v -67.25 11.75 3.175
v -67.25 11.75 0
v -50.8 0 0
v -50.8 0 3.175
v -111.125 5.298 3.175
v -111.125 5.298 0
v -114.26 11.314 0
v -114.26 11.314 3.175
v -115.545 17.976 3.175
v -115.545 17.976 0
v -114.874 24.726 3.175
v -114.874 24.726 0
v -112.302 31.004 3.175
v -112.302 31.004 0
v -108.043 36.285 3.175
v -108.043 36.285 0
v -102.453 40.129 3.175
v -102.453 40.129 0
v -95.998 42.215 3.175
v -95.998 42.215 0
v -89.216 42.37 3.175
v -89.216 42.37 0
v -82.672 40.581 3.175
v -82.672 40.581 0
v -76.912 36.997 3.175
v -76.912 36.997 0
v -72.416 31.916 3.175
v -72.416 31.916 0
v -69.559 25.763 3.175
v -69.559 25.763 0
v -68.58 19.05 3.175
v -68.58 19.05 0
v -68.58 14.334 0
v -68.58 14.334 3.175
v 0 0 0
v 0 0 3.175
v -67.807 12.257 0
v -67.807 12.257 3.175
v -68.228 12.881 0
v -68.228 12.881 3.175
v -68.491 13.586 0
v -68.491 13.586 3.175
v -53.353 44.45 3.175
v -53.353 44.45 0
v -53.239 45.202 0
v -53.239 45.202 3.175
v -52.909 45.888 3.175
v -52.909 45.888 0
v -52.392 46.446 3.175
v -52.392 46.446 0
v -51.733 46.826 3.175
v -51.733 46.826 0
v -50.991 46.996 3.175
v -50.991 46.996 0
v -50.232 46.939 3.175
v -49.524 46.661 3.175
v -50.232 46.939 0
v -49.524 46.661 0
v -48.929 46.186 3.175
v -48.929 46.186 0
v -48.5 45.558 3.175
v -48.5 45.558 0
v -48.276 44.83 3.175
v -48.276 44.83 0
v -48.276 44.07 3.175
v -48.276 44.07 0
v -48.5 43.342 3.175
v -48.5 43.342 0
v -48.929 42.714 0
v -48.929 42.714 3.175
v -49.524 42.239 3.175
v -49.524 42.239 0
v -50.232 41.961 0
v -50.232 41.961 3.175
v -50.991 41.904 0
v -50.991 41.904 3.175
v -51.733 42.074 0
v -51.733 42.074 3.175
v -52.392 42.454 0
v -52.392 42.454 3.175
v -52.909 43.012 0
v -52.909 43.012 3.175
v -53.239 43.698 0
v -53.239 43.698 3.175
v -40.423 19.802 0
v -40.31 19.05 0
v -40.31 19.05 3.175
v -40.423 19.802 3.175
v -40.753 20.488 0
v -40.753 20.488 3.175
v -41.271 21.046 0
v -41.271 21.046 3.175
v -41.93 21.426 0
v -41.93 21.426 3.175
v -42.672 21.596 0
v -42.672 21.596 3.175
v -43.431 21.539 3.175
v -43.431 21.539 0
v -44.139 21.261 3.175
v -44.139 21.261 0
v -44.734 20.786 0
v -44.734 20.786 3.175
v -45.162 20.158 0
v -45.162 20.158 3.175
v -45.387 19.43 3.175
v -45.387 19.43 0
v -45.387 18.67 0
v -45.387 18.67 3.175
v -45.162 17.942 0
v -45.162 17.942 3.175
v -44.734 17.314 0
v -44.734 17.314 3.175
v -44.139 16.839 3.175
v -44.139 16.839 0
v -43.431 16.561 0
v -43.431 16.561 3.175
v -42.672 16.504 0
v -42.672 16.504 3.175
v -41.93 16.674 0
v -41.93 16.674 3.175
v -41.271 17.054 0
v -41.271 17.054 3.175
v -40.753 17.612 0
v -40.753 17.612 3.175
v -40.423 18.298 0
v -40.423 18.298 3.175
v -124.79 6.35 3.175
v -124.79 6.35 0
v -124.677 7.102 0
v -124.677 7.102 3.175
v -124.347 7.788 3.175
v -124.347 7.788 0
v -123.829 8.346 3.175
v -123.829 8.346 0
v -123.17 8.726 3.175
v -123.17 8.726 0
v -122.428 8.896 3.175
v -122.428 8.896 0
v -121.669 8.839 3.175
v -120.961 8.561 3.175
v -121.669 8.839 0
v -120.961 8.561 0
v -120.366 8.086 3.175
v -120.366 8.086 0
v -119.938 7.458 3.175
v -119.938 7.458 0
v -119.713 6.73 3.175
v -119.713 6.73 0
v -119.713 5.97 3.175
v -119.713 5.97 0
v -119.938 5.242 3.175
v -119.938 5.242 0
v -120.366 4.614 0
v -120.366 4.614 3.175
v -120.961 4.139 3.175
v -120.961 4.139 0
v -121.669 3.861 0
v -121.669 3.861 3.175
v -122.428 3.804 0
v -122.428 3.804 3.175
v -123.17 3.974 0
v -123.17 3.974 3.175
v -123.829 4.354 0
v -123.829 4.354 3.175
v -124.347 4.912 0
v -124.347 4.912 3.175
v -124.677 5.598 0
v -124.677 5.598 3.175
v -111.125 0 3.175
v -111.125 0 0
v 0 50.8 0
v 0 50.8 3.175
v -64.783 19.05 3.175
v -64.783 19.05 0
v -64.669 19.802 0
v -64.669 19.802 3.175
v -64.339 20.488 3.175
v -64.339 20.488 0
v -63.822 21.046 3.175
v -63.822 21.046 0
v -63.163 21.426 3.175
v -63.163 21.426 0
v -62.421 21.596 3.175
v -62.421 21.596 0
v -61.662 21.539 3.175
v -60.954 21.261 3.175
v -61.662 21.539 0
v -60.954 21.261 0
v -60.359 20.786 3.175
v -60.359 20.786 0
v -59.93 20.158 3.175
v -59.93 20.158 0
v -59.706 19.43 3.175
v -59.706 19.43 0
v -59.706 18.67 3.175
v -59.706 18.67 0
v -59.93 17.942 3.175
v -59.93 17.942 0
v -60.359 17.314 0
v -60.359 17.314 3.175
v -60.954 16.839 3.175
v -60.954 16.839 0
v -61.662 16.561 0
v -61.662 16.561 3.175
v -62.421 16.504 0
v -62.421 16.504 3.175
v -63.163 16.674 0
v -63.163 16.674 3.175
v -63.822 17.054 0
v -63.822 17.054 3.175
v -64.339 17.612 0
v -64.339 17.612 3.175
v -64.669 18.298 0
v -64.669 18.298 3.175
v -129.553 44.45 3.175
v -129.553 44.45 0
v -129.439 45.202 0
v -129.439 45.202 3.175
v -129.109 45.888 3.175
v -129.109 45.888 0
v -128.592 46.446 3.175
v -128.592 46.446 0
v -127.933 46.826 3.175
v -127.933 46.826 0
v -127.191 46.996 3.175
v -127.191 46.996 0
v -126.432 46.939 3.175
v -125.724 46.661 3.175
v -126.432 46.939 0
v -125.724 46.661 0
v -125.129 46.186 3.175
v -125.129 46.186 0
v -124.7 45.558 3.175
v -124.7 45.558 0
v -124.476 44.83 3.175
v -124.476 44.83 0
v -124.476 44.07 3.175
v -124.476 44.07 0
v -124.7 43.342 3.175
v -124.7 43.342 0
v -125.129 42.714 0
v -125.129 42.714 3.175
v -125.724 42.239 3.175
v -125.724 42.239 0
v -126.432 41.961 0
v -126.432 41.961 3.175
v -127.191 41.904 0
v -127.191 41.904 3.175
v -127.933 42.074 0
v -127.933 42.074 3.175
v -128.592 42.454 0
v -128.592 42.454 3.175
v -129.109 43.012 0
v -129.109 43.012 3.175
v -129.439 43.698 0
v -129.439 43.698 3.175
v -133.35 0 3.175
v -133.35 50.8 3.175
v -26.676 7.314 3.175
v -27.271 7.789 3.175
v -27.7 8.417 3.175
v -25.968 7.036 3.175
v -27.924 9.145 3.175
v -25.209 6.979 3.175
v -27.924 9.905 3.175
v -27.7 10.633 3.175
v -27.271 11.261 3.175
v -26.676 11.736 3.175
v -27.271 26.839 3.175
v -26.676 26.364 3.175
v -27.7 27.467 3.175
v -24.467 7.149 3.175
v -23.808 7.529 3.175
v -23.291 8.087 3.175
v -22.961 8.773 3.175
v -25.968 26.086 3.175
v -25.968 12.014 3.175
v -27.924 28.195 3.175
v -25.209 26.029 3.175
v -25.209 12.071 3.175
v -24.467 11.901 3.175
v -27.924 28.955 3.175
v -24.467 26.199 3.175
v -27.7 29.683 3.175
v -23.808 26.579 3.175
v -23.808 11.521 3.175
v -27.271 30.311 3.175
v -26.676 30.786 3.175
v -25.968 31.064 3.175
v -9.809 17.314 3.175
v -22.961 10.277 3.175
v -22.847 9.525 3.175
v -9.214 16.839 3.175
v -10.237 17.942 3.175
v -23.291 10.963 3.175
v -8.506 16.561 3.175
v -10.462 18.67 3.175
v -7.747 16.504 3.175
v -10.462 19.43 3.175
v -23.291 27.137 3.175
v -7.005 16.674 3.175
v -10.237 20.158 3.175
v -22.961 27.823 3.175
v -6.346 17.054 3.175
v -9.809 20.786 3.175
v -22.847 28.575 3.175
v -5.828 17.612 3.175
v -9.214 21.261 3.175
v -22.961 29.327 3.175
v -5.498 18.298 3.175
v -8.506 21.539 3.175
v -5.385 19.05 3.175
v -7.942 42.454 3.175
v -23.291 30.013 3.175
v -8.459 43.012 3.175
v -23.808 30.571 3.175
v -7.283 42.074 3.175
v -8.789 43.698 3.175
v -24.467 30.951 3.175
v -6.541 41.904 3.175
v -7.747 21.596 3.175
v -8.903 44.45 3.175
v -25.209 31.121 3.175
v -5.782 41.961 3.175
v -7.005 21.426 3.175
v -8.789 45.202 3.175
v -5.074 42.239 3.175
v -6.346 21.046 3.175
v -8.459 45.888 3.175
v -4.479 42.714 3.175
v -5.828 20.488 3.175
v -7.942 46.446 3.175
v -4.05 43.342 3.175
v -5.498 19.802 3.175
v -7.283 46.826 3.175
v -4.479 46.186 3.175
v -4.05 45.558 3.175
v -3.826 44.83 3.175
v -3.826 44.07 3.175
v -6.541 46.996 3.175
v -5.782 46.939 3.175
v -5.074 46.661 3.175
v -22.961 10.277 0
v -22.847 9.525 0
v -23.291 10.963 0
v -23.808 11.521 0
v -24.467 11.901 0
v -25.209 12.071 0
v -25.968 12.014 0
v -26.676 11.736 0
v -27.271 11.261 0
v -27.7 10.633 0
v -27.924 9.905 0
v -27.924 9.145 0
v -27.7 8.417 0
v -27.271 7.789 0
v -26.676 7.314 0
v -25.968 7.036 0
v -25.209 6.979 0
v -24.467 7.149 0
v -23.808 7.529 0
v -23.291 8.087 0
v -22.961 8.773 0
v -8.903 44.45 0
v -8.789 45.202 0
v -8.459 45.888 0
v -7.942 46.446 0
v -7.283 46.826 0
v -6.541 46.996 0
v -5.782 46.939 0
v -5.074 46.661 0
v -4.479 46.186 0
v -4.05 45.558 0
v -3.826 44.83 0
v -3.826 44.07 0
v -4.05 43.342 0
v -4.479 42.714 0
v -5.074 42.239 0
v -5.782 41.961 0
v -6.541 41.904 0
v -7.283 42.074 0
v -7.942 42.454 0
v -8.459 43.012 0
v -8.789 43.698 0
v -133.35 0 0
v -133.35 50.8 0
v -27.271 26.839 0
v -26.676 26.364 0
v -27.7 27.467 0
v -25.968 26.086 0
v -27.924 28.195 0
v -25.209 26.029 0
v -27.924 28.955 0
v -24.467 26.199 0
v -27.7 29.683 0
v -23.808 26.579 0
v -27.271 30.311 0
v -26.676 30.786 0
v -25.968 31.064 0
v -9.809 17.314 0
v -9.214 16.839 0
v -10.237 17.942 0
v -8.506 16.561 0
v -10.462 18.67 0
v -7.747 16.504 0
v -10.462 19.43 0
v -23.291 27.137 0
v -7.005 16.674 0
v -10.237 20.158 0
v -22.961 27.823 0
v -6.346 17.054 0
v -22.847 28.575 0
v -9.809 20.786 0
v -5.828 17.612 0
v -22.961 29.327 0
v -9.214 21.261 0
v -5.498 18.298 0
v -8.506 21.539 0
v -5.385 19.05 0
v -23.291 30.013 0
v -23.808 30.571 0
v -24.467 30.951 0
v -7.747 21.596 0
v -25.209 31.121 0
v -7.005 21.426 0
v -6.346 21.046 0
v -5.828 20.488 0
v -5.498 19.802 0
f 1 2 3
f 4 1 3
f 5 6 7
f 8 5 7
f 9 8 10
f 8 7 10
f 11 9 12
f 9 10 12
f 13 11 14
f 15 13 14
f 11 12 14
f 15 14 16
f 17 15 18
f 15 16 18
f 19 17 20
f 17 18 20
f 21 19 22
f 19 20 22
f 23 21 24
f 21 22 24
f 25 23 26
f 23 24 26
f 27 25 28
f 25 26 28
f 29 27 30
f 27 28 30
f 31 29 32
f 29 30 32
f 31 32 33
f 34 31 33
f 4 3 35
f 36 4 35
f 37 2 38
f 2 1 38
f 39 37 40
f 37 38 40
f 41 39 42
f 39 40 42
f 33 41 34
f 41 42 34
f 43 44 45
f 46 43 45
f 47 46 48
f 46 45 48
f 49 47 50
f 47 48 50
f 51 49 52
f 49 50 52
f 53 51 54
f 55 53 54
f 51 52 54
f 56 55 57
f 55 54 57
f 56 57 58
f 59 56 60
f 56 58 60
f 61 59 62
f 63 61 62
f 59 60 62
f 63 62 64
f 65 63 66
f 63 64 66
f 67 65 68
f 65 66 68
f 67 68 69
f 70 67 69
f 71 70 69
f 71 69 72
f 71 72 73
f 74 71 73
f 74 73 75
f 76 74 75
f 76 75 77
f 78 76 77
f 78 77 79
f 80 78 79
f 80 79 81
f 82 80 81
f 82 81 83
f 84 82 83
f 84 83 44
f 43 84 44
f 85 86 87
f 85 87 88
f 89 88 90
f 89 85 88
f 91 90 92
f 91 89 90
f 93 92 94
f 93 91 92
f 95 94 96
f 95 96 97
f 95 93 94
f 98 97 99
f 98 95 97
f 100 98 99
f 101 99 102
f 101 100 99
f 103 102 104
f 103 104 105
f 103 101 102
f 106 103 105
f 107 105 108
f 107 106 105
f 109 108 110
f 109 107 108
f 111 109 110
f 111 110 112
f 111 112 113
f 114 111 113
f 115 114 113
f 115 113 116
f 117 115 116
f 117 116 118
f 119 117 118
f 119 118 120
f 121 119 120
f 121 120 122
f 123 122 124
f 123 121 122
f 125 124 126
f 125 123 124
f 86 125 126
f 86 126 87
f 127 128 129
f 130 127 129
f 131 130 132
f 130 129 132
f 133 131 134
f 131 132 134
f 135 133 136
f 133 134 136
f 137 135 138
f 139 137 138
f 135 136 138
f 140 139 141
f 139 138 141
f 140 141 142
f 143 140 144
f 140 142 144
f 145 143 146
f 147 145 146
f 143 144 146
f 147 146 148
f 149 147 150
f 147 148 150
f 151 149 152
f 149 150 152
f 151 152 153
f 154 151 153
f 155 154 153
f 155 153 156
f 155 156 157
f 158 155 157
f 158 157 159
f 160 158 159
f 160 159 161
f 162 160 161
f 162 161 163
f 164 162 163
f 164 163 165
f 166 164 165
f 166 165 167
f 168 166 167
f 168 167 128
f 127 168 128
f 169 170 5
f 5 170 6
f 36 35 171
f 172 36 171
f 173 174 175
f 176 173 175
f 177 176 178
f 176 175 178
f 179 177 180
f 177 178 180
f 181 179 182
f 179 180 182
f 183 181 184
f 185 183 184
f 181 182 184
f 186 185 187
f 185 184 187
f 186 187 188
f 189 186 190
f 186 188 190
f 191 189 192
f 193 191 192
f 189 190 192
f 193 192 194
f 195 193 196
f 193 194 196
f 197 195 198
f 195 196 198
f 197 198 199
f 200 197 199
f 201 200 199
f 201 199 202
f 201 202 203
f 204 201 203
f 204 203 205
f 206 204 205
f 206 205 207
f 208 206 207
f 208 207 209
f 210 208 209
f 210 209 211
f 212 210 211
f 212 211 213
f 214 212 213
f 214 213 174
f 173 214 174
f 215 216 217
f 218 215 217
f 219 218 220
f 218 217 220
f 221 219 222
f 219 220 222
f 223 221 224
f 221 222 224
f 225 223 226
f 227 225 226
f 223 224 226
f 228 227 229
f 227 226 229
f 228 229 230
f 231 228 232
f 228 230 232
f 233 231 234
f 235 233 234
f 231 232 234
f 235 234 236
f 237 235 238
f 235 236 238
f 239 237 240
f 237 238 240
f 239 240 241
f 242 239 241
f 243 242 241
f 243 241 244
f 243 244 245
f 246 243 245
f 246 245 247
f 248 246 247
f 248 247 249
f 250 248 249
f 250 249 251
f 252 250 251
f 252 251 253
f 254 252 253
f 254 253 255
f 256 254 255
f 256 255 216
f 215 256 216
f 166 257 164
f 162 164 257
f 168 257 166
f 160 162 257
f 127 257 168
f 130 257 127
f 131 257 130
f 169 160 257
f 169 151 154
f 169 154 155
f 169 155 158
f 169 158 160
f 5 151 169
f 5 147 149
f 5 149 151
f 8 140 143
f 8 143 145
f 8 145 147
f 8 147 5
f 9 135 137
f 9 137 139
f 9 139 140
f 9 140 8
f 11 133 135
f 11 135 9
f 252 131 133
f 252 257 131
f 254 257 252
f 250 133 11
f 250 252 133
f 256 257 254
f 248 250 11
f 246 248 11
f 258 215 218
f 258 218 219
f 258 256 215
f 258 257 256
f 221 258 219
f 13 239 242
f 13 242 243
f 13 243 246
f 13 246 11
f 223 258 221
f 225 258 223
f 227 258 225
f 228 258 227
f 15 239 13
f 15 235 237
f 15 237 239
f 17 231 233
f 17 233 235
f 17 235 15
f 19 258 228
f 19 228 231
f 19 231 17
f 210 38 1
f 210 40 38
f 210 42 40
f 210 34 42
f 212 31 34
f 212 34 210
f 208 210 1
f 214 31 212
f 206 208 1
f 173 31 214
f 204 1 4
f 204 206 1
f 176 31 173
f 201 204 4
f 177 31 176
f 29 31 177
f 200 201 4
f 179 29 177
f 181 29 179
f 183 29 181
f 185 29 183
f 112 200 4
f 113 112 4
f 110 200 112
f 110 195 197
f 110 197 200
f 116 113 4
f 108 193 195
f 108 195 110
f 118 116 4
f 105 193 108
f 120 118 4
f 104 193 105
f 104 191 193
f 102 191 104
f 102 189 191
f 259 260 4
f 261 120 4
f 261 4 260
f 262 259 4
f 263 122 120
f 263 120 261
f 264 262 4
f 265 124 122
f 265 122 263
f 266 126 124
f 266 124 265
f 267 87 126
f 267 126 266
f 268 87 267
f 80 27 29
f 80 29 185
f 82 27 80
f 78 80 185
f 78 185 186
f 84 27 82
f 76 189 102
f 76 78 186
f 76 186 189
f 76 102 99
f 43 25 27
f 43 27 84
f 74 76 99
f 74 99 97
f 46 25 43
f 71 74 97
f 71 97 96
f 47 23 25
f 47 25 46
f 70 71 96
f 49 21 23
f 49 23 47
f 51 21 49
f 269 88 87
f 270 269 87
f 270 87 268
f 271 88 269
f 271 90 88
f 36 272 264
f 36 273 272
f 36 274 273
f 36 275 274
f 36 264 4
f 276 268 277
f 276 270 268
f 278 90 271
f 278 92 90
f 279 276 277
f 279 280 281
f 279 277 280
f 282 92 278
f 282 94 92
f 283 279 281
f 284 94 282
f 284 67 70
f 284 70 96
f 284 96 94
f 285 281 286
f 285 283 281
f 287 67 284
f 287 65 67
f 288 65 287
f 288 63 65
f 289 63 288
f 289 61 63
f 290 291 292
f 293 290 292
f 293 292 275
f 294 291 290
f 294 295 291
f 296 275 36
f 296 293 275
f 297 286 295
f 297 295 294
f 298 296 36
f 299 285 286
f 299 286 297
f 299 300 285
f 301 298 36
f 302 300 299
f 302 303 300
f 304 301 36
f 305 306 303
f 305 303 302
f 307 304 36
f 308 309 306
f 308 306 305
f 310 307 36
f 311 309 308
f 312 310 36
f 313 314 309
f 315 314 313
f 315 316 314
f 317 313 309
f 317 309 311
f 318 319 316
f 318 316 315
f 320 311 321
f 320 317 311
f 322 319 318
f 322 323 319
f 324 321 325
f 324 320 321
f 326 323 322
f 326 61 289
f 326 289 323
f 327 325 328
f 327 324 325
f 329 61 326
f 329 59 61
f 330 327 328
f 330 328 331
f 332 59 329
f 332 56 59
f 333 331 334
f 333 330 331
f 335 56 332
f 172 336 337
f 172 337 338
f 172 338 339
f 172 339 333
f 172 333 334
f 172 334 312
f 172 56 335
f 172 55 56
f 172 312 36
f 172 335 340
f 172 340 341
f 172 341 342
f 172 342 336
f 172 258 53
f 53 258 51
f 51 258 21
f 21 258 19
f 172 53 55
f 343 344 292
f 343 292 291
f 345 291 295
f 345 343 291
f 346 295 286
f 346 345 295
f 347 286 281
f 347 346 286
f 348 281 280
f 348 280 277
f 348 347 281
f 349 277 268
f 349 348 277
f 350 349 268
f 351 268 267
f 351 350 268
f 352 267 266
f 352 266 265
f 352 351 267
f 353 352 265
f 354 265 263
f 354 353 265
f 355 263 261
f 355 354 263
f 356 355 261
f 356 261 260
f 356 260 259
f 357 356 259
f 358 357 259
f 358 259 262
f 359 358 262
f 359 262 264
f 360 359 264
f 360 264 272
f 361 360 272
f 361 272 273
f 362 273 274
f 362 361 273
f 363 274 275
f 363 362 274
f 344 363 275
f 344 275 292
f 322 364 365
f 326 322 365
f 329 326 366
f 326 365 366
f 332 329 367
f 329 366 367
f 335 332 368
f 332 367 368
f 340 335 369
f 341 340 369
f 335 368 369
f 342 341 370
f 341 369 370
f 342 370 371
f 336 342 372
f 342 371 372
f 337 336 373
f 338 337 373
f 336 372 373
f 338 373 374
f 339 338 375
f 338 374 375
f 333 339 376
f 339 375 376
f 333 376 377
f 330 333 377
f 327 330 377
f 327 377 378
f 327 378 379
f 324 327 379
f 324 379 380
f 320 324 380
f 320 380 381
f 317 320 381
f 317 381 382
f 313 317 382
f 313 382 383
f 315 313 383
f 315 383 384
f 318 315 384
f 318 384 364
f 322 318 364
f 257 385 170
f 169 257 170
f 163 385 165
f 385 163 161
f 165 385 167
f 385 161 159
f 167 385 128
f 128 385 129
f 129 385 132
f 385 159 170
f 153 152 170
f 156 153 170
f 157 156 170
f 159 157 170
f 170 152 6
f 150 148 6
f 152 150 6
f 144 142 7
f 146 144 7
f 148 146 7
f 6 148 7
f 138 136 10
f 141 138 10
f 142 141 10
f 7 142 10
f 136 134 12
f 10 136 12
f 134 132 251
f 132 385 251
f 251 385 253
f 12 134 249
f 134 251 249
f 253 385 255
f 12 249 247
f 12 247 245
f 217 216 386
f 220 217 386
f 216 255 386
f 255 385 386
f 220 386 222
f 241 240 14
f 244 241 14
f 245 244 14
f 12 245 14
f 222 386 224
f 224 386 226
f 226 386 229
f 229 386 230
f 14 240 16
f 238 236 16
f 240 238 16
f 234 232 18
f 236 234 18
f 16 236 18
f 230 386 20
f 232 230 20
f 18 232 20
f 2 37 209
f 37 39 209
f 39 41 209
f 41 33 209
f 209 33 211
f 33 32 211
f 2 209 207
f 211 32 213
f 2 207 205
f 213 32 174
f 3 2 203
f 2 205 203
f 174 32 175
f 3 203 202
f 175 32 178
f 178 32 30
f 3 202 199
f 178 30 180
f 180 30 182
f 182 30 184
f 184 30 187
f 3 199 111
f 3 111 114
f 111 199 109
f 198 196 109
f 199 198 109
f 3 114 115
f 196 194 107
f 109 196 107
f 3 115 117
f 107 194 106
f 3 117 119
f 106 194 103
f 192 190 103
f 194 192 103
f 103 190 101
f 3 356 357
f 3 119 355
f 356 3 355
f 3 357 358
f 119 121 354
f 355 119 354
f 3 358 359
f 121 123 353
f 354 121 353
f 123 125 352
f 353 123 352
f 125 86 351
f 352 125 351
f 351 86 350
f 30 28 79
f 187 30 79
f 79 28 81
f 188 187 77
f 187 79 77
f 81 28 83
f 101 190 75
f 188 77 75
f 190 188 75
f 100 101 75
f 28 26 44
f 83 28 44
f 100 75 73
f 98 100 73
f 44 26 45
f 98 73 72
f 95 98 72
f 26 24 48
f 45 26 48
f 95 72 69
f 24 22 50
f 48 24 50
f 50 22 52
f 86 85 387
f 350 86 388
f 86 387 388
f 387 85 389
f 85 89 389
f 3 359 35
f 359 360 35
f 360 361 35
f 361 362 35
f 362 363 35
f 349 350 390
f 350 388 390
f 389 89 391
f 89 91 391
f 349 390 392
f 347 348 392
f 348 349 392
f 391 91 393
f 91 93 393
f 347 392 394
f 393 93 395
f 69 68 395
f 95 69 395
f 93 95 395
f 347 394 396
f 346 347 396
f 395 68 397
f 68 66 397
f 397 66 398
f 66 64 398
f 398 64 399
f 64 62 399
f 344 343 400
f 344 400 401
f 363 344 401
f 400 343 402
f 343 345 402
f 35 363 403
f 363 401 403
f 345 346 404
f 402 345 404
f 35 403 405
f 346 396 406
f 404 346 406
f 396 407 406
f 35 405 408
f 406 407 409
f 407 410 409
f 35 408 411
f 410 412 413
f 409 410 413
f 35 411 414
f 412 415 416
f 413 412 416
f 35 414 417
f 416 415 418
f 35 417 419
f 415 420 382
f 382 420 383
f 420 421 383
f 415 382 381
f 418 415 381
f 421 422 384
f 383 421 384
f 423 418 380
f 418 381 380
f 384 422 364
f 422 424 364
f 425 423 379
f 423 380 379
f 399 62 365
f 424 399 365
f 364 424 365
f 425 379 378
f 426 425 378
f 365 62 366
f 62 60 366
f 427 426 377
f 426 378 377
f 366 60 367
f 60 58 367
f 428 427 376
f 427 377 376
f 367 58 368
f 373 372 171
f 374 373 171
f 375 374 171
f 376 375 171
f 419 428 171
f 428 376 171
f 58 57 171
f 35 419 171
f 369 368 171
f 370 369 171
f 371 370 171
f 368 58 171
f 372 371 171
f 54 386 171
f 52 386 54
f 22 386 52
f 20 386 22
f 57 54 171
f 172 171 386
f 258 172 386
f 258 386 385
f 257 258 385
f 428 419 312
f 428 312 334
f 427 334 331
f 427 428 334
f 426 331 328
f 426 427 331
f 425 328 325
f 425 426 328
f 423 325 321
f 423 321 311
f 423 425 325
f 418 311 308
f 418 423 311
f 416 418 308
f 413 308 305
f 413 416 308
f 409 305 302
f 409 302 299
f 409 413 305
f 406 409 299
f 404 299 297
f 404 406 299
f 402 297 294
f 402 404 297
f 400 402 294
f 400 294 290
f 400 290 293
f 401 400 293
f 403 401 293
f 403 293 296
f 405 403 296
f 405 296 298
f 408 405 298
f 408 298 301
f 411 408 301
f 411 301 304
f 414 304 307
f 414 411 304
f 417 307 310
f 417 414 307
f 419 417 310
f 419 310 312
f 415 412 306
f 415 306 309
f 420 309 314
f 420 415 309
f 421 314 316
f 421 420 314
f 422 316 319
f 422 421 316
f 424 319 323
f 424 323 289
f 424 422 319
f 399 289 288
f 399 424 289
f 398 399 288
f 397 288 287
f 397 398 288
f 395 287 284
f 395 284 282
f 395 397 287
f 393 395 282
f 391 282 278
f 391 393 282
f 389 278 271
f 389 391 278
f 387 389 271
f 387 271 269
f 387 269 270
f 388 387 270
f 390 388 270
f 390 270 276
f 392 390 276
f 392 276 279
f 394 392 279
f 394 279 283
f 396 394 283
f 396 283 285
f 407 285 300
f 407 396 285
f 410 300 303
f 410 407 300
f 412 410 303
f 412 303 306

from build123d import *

# Parameters (mm, degrees)
SKETCH1_R           = 2.5527
BOSS_EXTRUDE1_DEPTH = 3.175
SKETCH3_R           = 2.5527
CUT_EXTRUDE2_DEPTH  = 143.733819135
FILLET1_R           = 3.175


with BuildPart() as part:
    # Sketch1 → Boss-Extrude1 (new body)
    with BuildSketch(Plane.XY):
        with BuildLine():
            Line((0, 0), (0, 50.8))
            Line((0, 50.8), (-133.35, 50.8))
            Line((-133.35, 50.8), (-133.35, 0))
            Line((-133.35, 0), (-111.125, 0))
            Line((-111.125, 0), (-111.125, 5.298181029))
            ThreePointArc((-111.125, 5.298181029), (-99.30117724, 41.406148763), (-68.58, 19.05))
            Line((-68.58, 19.05), (-68.58, 12.7))
            Line((-68.58, 12.7), (-50.8, 0))
            Line((-50.8, 0), (0, 0))
        make_face()
        with Locations((-25.4, 9.525)):
            Circle(SKETCH1_R, mode=Mode.SUBTRACT)
        with Locations((-25.4, 28.575)):
            Circle(SKETCH1_R, mode=Mode.SUBTRACT)
        with Locations((-7.9375, 19.05)):
            Circle(SKETCH1_R, mode=Mode.SUBTRACT)
        with Locations((-42.8625, 19.05)):
            Circle(SKETCH1_R, mode=Mode.SUBTRACT)
    extrude(amount=BOSS_EXTRUDE1_DEPTH)

    # Sketch3 → Cut-Extrude2 (cut, through all)
    with BuildSketch(Plane(origin=(0, 0, 0), x_dir=(-1, 0, 0), z_dir=(0, 0, -1))):
        with Locations((122.2375, 6.35)):
            Circle(SKETCH3_R)
        with Locations((127, 44.45)):
            Circle(SKETCH3_R)
        with Locations((6.35, 44.45)):
            Circle(SKETCH3_R)
        with Locations((50.8, 44.45)):
            Circle(SKETCH3_R)
        with Locations((62.23, 19.05)):
            Circle(SKETCH3_R)
    extrude(amount=-CUT_EXTRUDE2_DEPTH, mode=Mode.SUBTRACT)

    # Fillet1
    fillet1_edges = [part.edges().sort_by_distance(p)[0] for p in [
        (-68.58, 12.7, 1.5875),
    ]]
    fillet(fillet1_edges, radius=FILLET1_R)


solid = part.part
